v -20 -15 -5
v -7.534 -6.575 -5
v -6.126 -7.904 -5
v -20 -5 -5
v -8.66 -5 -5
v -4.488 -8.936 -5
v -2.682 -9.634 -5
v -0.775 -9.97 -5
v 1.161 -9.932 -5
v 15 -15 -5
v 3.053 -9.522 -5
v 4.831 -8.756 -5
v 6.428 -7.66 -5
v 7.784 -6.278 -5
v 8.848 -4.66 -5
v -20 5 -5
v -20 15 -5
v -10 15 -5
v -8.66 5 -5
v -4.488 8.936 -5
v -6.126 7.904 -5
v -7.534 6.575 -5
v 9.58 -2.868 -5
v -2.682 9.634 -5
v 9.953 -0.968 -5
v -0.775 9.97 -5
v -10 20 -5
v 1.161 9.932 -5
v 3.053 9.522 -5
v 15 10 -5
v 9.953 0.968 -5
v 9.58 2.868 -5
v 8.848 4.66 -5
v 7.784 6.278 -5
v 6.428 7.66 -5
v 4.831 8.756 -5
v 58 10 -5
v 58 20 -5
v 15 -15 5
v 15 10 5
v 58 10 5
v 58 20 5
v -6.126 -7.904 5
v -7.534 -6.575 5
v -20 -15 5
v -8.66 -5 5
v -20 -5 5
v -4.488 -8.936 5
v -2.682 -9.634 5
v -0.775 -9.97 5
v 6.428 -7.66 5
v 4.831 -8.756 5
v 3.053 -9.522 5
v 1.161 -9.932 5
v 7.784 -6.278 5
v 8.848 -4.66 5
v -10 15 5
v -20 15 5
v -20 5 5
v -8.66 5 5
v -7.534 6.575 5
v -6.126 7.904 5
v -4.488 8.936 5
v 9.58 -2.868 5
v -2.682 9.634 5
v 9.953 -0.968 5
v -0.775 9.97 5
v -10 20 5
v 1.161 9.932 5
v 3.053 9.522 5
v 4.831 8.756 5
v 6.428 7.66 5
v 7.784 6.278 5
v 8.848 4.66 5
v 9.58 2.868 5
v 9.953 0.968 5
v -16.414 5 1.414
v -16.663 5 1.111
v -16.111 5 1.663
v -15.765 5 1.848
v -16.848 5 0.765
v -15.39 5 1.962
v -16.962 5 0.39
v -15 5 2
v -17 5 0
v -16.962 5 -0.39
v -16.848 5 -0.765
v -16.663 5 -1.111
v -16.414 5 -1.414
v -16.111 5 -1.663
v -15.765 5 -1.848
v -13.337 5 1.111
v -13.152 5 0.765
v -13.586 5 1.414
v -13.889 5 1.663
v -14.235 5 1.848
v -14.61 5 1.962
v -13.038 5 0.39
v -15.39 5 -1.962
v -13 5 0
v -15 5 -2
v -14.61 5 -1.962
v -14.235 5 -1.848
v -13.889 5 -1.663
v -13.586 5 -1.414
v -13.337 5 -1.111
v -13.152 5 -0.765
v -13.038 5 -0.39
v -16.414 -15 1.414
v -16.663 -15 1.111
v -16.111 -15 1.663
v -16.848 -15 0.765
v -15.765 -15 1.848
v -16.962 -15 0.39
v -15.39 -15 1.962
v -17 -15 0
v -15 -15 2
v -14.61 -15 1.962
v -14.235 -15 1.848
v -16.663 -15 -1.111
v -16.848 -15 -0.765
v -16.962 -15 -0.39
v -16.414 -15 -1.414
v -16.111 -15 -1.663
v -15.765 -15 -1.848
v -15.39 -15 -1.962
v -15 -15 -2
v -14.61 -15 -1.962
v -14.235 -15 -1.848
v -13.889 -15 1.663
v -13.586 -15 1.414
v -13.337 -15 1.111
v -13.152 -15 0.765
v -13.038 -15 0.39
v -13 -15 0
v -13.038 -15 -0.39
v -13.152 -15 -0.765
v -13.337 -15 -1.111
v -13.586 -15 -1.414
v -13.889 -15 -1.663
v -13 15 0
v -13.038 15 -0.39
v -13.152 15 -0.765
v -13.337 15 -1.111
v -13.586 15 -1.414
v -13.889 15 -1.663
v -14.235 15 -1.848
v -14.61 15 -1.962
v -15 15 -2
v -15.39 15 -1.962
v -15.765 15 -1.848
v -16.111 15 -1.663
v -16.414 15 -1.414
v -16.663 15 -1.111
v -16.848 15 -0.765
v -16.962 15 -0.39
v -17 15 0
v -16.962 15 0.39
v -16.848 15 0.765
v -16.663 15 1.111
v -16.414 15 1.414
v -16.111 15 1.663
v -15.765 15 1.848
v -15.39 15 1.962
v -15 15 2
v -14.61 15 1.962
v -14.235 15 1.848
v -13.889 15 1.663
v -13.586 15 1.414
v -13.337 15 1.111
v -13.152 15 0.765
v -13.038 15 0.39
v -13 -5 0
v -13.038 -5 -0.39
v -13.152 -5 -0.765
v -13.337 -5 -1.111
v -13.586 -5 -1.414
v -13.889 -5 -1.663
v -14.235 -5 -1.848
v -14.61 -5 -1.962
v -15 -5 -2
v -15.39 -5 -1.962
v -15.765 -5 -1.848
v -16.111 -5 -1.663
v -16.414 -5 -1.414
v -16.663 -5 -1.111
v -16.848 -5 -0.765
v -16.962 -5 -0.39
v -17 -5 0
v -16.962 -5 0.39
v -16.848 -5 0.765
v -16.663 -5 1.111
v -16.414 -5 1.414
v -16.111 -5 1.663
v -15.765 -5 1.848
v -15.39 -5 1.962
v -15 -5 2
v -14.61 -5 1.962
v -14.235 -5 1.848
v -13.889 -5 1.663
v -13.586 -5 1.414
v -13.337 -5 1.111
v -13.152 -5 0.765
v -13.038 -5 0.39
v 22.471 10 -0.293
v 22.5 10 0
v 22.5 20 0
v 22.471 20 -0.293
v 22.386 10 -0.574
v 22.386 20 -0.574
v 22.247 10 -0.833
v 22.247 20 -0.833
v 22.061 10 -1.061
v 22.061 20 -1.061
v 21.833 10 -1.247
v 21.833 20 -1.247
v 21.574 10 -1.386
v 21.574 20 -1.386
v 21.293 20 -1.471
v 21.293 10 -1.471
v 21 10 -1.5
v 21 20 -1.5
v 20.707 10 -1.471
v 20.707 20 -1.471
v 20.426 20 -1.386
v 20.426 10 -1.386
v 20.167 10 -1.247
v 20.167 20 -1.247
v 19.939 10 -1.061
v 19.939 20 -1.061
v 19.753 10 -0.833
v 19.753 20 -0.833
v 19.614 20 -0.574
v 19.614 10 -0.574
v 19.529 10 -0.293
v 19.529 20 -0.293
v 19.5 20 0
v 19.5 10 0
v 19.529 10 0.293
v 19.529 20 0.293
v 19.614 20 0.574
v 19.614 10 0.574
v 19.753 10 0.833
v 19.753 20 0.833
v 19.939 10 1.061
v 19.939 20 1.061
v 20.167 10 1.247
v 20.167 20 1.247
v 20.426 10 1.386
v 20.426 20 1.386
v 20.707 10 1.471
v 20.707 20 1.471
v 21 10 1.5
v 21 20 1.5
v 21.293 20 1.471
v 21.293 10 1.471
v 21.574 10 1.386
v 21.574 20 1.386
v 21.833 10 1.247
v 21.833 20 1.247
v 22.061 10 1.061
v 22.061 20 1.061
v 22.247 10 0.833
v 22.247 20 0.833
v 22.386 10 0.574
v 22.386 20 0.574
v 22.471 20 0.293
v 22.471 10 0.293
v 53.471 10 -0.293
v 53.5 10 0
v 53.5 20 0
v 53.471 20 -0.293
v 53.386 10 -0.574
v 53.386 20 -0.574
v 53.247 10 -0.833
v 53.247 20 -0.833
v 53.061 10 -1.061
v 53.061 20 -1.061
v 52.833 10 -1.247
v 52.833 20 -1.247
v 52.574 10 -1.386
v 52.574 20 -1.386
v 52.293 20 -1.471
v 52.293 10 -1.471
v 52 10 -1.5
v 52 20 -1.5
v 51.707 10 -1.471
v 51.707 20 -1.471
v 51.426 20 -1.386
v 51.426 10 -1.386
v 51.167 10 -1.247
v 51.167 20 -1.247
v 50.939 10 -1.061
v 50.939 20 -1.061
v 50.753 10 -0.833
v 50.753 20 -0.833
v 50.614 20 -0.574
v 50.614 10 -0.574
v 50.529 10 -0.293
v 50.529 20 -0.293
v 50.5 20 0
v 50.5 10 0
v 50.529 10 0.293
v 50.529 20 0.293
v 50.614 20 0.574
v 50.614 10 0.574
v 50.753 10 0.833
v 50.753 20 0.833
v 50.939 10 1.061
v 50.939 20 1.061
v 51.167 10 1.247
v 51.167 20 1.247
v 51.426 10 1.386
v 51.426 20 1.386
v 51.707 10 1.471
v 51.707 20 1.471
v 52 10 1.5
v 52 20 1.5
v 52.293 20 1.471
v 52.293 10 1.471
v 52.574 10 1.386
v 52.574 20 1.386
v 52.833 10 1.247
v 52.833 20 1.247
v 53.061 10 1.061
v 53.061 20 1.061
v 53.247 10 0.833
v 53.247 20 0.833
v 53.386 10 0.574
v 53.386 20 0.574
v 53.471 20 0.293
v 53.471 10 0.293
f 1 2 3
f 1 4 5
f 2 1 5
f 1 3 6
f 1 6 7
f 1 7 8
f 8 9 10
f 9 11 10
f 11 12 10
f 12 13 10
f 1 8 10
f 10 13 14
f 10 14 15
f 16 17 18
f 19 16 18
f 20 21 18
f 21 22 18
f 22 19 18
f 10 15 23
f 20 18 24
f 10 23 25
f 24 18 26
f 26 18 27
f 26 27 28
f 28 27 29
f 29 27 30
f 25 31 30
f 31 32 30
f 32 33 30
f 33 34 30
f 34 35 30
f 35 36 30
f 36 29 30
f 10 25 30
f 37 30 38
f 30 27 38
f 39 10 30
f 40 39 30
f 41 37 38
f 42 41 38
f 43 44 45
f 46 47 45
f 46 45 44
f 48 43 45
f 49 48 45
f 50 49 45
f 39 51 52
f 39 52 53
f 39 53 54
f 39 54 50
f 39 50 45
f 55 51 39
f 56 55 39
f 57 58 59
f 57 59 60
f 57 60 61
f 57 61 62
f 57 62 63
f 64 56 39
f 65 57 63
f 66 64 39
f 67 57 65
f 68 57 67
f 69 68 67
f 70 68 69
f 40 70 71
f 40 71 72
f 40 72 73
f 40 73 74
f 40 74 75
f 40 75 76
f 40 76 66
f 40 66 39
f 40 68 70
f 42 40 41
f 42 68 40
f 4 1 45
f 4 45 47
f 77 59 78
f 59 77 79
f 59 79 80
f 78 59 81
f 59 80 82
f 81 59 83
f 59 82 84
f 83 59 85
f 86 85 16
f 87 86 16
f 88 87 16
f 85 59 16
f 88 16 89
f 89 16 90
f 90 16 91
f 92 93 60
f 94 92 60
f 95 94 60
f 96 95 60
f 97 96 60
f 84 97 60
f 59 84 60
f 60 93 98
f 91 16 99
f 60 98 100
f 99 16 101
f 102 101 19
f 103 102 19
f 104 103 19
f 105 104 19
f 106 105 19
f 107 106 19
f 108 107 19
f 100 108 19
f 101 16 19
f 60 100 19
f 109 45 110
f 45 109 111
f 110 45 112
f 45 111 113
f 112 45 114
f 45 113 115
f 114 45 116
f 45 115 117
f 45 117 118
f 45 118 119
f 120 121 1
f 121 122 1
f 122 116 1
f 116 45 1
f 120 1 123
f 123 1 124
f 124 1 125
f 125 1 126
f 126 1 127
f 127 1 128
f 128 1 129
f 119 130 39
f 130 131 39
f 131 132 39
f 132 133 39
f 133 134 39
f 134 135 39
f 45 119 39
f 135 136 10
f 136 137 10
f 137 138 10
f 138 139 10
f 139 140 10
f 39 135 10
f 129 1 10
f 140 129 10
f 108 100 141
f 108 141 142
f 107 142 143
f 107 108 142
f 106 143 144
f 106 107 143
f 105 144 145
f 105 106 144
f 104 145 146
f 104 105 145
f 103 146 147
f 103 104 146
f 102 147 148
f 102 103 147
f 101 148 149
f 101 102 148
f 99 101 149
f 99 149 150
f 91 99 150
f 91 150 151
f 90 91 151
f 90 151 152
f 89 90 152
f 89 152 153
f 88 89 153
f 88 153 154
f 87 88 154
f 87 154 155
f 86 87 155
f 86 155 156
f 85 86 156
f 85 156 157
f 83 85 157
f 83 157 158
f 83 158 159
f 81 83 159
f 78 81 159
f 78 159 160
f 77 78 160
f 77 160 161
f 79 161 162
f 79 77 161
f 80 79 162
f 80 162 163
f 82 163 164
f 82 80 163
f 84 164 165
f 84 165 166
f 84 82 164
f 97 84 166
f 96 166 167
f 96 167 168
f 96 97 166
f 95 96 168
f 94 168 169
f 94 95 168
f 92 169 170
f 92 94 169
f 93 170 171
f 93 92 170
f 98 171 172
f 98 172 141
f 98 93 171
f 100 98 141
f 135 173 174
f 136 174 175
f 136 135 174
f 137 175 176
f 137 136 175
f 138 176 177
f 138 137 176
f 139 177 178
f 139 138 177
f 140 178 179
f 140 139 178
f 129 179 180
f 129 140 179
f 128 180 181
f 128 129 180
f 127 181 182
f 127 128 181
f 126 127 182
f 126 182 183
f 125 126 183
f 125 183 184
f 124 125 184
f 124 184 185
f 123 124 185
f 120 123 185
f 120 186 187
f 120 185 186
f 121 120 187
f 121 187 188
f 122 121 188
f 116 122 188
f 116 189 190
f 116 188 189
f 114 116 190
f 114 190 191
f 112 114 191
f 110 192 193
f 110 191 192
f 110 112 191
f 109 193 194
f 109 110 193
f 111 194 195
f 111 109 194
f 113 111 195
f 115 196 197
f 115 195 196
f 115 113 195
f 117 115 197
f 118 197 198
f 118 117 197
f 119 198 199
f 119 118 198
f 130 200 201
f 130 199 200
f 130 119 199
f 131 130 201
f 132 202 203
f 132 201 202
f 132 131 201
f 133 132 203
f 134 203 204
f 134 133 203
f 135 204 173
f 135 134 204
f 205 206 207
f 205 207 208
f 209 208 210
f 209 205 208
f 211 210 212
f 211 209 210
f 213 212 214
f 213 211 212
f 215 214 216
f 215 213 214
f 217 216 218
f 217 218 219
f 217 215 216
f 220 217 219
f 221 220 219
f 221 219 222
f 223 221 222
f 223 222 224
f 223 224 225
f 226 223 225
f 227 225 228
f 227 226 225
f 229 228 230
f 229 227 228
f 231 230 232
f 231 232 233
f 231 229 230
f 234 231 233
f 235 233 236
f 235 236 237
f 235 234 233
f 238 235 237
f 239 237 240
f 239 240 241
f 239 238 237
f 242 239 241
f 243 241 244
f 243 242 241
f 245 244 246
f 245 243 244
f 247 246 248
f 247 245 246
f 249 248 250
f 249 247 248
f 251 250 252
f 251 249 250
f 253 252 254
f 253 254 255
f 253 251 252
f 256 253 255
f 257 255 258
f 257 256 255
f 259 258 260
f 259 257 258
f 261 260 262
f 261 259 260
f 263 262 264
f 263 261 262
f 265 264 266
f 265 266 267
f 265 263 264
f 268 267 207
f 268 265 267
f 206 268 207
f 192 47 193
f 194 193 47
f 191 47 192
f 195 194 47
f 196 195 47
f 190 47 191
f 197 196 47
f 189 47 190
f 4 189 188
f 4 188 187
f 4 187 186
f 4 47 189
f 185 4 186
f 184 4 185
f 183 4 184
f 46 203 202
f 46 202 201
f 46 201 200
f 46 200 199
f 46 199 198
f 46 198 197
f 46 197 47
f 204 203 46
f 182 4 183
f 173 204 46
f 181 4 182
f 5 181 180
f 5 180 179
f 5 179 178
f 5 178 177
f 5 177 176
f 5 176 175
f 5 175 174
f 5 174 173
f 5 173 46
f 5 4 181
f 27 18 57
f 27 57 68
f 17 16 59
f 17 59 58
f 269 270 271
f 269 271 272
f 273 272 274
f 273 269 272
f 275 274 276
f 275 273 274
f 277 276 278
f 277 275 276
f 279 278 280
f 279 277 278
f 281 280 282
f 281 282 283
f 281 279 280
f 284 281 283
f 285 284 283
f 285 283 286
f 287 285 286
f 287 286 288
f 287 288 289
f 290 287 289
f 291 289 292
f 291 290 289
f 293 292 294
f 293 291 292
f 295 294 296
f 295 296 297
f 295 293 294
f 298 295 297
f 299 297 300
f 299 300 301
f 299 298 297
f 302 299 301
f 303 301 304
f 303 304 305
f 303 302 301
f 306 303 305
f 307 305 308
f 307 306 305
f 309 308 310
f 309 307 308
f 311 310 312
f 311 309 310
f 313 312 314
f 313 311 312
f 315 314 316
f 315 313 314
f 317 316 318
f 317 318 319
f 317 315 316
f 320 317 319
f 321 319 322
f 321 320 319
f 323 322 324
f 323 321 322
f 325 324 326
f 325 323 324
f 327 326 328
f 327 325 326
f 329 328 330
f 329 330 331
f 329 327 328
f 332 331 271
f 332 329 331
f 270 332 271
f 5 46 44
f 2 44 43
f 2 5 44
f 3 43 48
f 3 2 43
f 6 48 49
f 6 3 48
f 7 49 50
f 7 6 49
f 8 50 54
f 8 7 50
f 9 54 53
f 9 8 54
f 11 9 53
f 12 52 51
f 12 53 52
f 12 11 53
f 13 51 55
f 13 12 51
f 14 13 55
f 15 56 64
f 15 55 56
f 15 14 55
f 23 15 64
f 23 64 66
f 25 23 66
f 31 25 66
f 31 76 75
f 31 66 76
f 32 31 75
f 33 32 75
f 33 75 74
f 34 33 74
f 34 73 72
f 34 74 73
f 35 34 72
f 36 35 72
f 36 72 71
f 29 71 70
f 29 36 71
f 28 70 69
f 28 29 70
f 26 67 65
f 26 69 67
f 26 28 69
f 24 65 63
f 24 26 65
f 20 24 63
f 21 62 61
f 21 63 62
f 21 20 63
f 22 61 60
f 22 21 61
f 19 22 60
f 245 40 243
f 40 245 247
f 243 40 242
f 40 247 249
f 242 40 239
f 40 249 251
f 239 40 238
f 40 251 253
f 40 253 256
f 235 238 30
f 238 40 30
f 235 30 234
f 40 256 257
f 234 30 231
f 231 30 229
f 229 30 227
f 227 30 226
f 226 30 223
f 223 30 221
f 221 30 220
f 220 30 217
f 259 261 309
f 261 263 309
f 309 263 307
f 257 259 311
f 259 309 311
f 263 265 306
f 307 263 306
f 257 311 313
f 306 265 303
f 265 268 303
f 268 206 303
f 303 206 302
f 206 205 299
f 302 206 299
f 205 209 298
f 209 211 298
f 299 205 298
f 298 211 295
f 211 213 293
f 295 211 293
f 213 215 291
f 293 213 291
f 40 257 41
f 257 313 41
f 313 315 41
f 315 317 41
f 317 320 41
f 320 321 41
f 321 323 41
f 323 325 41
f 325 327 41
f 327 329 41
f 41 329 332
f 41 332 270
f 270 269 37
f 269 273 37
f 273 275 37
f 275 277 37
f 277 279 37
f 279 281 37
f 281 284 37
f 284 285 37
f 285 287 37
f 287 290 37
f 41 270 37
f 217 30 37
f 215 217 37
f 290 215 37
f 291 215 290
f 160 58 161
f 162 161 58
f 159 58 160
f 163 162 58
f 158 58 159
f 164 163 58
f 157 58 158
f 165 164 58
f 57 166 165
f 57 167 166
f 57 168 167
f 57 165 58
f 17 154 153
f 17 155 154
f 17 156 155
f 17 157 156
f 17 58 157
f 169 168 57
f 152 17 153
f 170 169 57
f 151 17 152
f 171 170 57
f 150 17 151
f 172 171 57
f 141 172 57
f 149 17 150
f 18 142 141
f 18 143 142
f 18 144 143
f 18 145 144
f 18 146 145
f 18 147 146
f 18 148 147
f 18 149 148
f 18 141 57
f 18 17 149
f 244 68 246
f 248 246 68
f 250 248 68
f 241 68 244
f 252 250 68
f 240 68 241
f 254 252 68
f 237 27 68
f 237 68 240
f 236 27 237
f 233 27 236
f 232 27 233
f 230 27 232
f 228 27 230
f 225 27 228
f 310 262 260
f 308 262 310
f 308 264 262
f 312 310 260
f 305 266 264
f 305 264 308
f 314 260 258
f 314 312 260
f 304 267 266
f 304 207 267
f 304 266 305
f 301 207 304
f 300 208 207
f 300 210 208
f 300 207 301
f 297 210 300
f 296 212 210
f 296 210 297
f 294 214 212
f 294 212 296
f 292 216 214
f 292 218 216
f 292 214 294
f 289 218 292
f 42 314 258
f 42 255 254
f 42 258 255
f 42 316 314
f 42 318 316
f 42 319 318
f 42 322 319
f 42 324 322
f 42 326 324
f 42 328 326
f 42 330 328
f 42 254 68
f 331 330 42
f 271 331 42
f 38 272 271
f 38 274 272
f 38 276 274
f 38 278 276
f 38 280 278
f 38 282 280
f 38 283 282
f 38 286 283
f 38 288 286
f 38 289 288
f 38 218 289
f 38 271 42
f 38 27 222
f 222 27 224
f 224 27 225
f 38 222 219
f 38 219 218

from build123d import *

# Parameters (mm, degrees)
CYLINDER_R             = 10
CYLINDER_DEPTH         = 10
CYLINDER001_R          = 2
CYLINDER001_DEPTH      = 30
CYLINDER001_ROLL_ANGLE = -90
CYLINDER003_R          = 1.5
CYLINDER003_DEPTH      = 10
CYLINDER003_ROLL_ANGLE = -90
CYLINDER002_R          = 1.5
CYLINDER002_DEPTH      = 10
CYLINDER002_ROLL_ANGLE = -90
BOX001_W               = 15
BOX001_H               = 10
BOX001_DEPTH           = 10
BOX_W                  = 35
BOX_H                  = 30
BOX_DEPTH              = 10
BOX002_W               = 68
BOX002_H               = 10
BOX002_DEPTH           = 10


with BuildPart() as cylinder:
    # Cylinder → Cylinder (new body)
    with BuildSketch(Plane.XY.offset(-5)):
        Circle(CYLINDER_R)
    extrude(amount=CYLINDER_DEPTH)


with BuildPart() as cylinder001:
    # Cylinder001 → Cylinder001 (new body)
    with BuildSketch(Plane.XY):
        Circle(CYLINDER001_R)
    extrude(amount=CYLINDER001_DEPTH)


with BuildPart() as cylinder001_1:
    # Cylinder001 roll: moved
    add(cylinder001.part.rotate(Axis((0, 0, 0), (1, 0, 0)), CYLINDER001_ROLL_ANGLE))


with BuildPart() as cylinder001_2:
    # Cylinder001 placement: moved
    add(cylinder001_1.part.moved(Location((-15, -15, 0))))


with BuildPart() as cylinder003:
    # Cylinder003 → Cylinder003 (new body)
    with BuildSketch(Plane.XY):
        Circle(CYLINDER003_R)
    extrude(amount=CYLINDER003_DEPTH)


with BuildPart() as cylinder003_1:
    # Cylinder003 roll: moved
    add(cylinder003.part.rotate(Axis((0, 0, 0), (1, 0, 0)), CYLINDER003_ROLL_ANGLE))


with BuildPart() as cylinder003_2:
    # Cylinder003 placement: moved
    add(cylinder003_1.part.moved(Location((52, 10, 0))))


with BuildPart() as cylinder002:
    # Cylinder002 → Cylinder002 (new body)
    with BuildSketch(Plane.XY):
        Circle(CYLINDER002_R)
    extrude(amount=CYLINDER002_DEPTH)


with BuildPart() as cylinder002_1:
    # Cylinder002 roll: moved
    add(cylinder002.part.rotate(Axis((0, 0, 0), (1, 0, 0)), CYLINDER002_ROLL_ANGLE))


with BuildPart() as cylinder002_2:
    # Cylinder002 placement: moved
    add(cylinder002_1.part.moved(Location((21, 10, 0))))


with BuildPart() as negative_fusion:
    # Box001 → Box001 (new body)
    with BuildSketch(Plane(origin=(-20, -5, -5), x_dir=(1, 0, 0), z_dir=(0, 0, 1))):
        with Locations((7.5, 5)):
            Rectangle(BOX001_W, BOX001_H)
    extrude(amount=BOX001_DEPTH)

    # Fusion: union Cylinder, Cylinder001, Cylinder003, Cylinder002
    add(cylinder.part)
    add(cylinder001_2.part)
    add(cylinder003_2.part)
    add(cylinder002_2.part)


with BuildPart() as cube:
    # Box → Box (new body)
    with BuildSketch(Plane(origin=(-20, -15, -5), x_dir=(1, 0, 0), z_dir=(0, 0, 1))):
        with Locations((17.5, 15)):
            Rectangle(BOX_W, BOX_H)
    extrude(amount=BOX_DEPTH)


with BuildPart() as cut:
    # Box002 → Box002 (new body)
    with BuildSketch(Plane(origin=(-10, 10, -5), x_dir=(1, 0, 0), z_dir=(0, 0, 1))):
        with Locations((34, 5)):
            Rectangle(BOX002_W, BOX002_H)
    extrude(amount=BOX002_DEPTH)

    # Fusion001: union Cube
    add(cube.part)

    # Cut: cut Negative Fusion
    add(negative_fusion.part, mode=Mode.SUBTRACT)


solid = cut.part
